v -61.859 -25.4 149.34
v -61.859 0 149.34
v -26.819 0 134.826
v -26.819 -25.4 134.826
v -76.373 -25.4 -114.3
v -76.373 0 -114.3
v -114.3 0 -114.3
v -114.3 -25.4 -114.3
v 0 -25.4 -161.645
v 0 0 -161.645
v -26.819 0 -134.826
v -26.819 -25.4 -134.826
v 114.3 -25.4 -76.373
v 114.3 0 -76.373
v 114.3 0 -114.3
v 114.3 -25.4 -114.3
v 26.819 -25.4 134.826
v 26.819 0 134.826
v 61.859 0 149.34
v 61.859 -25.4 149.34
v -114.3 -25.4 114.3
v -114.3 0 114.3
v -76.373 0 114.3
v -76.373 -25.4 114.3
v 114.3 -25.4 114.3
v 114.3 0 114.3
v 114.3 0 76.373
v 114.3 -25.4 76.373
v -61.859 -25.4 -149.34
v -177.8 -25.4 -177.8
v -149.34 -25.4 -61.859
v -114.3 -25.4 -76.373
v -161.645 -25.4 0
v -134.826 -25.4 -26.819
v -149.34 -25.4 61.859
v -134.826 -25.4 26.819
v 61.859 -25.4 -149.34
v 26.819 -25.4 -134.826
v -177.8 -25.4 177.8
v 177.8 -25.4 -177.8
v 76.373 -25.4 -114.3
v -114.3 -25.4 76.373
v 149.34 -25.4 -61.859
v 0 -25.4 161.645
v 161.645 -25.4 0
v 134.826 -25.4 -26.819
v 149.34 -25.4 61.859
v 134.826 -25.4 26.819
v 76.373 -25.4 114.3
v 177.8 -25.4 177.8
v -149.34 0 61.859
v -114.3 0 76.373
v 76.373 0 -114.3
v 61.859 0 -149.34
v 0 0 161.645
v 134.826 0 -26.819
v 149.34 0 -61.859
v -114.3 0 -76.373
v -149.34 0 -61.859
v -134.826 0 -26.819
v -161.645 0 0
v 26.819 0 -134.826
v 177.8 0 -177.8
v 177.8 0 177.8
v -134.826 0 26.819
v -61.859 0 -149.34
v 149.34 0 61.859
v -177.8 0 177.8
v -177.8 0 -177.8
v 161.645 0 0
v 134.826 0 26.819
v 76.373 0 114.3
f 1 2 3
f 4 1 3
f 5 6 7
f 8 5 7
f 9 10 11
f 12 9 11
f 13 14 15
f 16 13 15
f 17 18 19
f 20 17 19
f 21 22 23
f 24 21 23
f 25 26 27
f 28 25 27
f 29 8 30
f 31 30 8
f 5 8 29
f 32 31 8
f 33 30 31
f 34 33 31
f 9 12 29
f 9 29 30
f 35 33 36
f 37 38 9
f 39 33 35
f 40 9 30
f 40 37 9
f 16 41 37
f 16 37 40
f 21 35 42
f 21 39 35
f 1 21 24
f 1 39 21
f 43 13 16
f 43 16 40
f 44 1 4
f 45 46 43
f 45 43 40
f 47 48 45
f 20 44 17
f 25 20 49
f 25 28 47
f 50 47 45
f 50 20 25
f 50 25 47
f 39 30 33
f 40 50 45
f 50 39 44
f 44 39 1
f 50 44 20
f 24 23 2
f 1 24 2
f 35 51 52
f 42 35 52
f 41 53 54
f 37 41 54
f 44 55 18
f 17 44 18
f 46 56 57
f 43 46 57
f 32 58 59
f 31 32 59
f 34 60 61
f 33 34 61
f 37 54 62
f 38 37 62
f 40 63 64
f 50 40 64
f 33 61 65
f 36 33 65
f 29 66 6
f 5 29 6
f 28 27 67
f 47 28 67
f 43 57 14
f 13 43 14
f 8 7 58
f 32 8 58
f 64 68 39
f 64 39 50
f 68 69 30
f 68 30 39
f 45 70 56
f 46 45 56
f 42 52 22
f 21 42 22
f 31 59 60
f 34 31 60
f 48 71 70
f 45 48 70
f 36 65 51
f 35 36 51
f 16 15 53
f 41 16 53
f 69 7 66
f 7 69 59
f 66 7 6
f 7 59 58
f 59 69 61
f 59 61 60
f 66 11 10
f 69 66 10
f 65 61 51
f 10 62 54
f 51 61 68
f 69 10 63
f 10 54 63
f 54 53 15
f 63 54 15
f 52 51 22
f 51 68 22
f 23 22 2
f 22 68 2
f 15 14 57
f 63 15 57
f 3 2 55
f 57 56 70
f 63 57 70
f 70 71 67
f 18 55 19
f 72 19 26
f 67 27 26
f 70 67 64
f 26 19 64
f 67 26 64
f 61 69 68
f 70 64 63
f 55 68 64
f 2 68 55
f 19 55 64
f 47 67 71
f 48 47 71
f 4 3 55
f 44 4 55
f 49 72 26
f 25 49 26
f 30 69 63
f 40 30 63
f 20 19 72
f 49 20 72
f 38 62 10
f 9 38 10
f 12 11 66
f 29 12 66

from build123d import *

# Parameters (mm, degrees)
F0_W     = 355.6
F0_H     = 355.6
F1_DEPTH = 25.4


with BuildPart() as f1:
    # F0 (on Front) → F1 (new body)
    with BuildSketch(Plane.XZ):
        Rectangle(F0_W, F0_H)
        Polygon((76.372818, 114.3), (114.3, 114.3), (114.3, 76.372818), (149.340147, 61.858714), (134.826043, 26.818567), (161.64461, 0), (134.826043, -26.818567), (149.340147, -61.858714), (114.3, -76.372818), (114.3, -114.3), (76.372818, -114.3), (61.858714, -149.340147), (26.818567, -134.826043), (0, -161.64461), (-26.818567, -134.826043), (-61.858714, -149.340147), (-76.372818, -114.3), (-114.3, -114.3), (-114.3, -76.372818), (-149.340147, -61.858714), (-134.826043, -26.818567), (-161.64461, 0), (-134.826043, 26.818567), (-149.340147, 61.858714), (-114.3, 76.372818), (-114.3, 114.3), (-76.372818, 114.3), (-61.858714, 149.340147), (-26.818567, 134.826043), (0, 161.64461), (26.818567, 134.826043), (61.858714, 149.340147), align=None, mode=Mode.SUBTRACT)
    extrude(amount=F1_DEPTH)


solid = f1.part
